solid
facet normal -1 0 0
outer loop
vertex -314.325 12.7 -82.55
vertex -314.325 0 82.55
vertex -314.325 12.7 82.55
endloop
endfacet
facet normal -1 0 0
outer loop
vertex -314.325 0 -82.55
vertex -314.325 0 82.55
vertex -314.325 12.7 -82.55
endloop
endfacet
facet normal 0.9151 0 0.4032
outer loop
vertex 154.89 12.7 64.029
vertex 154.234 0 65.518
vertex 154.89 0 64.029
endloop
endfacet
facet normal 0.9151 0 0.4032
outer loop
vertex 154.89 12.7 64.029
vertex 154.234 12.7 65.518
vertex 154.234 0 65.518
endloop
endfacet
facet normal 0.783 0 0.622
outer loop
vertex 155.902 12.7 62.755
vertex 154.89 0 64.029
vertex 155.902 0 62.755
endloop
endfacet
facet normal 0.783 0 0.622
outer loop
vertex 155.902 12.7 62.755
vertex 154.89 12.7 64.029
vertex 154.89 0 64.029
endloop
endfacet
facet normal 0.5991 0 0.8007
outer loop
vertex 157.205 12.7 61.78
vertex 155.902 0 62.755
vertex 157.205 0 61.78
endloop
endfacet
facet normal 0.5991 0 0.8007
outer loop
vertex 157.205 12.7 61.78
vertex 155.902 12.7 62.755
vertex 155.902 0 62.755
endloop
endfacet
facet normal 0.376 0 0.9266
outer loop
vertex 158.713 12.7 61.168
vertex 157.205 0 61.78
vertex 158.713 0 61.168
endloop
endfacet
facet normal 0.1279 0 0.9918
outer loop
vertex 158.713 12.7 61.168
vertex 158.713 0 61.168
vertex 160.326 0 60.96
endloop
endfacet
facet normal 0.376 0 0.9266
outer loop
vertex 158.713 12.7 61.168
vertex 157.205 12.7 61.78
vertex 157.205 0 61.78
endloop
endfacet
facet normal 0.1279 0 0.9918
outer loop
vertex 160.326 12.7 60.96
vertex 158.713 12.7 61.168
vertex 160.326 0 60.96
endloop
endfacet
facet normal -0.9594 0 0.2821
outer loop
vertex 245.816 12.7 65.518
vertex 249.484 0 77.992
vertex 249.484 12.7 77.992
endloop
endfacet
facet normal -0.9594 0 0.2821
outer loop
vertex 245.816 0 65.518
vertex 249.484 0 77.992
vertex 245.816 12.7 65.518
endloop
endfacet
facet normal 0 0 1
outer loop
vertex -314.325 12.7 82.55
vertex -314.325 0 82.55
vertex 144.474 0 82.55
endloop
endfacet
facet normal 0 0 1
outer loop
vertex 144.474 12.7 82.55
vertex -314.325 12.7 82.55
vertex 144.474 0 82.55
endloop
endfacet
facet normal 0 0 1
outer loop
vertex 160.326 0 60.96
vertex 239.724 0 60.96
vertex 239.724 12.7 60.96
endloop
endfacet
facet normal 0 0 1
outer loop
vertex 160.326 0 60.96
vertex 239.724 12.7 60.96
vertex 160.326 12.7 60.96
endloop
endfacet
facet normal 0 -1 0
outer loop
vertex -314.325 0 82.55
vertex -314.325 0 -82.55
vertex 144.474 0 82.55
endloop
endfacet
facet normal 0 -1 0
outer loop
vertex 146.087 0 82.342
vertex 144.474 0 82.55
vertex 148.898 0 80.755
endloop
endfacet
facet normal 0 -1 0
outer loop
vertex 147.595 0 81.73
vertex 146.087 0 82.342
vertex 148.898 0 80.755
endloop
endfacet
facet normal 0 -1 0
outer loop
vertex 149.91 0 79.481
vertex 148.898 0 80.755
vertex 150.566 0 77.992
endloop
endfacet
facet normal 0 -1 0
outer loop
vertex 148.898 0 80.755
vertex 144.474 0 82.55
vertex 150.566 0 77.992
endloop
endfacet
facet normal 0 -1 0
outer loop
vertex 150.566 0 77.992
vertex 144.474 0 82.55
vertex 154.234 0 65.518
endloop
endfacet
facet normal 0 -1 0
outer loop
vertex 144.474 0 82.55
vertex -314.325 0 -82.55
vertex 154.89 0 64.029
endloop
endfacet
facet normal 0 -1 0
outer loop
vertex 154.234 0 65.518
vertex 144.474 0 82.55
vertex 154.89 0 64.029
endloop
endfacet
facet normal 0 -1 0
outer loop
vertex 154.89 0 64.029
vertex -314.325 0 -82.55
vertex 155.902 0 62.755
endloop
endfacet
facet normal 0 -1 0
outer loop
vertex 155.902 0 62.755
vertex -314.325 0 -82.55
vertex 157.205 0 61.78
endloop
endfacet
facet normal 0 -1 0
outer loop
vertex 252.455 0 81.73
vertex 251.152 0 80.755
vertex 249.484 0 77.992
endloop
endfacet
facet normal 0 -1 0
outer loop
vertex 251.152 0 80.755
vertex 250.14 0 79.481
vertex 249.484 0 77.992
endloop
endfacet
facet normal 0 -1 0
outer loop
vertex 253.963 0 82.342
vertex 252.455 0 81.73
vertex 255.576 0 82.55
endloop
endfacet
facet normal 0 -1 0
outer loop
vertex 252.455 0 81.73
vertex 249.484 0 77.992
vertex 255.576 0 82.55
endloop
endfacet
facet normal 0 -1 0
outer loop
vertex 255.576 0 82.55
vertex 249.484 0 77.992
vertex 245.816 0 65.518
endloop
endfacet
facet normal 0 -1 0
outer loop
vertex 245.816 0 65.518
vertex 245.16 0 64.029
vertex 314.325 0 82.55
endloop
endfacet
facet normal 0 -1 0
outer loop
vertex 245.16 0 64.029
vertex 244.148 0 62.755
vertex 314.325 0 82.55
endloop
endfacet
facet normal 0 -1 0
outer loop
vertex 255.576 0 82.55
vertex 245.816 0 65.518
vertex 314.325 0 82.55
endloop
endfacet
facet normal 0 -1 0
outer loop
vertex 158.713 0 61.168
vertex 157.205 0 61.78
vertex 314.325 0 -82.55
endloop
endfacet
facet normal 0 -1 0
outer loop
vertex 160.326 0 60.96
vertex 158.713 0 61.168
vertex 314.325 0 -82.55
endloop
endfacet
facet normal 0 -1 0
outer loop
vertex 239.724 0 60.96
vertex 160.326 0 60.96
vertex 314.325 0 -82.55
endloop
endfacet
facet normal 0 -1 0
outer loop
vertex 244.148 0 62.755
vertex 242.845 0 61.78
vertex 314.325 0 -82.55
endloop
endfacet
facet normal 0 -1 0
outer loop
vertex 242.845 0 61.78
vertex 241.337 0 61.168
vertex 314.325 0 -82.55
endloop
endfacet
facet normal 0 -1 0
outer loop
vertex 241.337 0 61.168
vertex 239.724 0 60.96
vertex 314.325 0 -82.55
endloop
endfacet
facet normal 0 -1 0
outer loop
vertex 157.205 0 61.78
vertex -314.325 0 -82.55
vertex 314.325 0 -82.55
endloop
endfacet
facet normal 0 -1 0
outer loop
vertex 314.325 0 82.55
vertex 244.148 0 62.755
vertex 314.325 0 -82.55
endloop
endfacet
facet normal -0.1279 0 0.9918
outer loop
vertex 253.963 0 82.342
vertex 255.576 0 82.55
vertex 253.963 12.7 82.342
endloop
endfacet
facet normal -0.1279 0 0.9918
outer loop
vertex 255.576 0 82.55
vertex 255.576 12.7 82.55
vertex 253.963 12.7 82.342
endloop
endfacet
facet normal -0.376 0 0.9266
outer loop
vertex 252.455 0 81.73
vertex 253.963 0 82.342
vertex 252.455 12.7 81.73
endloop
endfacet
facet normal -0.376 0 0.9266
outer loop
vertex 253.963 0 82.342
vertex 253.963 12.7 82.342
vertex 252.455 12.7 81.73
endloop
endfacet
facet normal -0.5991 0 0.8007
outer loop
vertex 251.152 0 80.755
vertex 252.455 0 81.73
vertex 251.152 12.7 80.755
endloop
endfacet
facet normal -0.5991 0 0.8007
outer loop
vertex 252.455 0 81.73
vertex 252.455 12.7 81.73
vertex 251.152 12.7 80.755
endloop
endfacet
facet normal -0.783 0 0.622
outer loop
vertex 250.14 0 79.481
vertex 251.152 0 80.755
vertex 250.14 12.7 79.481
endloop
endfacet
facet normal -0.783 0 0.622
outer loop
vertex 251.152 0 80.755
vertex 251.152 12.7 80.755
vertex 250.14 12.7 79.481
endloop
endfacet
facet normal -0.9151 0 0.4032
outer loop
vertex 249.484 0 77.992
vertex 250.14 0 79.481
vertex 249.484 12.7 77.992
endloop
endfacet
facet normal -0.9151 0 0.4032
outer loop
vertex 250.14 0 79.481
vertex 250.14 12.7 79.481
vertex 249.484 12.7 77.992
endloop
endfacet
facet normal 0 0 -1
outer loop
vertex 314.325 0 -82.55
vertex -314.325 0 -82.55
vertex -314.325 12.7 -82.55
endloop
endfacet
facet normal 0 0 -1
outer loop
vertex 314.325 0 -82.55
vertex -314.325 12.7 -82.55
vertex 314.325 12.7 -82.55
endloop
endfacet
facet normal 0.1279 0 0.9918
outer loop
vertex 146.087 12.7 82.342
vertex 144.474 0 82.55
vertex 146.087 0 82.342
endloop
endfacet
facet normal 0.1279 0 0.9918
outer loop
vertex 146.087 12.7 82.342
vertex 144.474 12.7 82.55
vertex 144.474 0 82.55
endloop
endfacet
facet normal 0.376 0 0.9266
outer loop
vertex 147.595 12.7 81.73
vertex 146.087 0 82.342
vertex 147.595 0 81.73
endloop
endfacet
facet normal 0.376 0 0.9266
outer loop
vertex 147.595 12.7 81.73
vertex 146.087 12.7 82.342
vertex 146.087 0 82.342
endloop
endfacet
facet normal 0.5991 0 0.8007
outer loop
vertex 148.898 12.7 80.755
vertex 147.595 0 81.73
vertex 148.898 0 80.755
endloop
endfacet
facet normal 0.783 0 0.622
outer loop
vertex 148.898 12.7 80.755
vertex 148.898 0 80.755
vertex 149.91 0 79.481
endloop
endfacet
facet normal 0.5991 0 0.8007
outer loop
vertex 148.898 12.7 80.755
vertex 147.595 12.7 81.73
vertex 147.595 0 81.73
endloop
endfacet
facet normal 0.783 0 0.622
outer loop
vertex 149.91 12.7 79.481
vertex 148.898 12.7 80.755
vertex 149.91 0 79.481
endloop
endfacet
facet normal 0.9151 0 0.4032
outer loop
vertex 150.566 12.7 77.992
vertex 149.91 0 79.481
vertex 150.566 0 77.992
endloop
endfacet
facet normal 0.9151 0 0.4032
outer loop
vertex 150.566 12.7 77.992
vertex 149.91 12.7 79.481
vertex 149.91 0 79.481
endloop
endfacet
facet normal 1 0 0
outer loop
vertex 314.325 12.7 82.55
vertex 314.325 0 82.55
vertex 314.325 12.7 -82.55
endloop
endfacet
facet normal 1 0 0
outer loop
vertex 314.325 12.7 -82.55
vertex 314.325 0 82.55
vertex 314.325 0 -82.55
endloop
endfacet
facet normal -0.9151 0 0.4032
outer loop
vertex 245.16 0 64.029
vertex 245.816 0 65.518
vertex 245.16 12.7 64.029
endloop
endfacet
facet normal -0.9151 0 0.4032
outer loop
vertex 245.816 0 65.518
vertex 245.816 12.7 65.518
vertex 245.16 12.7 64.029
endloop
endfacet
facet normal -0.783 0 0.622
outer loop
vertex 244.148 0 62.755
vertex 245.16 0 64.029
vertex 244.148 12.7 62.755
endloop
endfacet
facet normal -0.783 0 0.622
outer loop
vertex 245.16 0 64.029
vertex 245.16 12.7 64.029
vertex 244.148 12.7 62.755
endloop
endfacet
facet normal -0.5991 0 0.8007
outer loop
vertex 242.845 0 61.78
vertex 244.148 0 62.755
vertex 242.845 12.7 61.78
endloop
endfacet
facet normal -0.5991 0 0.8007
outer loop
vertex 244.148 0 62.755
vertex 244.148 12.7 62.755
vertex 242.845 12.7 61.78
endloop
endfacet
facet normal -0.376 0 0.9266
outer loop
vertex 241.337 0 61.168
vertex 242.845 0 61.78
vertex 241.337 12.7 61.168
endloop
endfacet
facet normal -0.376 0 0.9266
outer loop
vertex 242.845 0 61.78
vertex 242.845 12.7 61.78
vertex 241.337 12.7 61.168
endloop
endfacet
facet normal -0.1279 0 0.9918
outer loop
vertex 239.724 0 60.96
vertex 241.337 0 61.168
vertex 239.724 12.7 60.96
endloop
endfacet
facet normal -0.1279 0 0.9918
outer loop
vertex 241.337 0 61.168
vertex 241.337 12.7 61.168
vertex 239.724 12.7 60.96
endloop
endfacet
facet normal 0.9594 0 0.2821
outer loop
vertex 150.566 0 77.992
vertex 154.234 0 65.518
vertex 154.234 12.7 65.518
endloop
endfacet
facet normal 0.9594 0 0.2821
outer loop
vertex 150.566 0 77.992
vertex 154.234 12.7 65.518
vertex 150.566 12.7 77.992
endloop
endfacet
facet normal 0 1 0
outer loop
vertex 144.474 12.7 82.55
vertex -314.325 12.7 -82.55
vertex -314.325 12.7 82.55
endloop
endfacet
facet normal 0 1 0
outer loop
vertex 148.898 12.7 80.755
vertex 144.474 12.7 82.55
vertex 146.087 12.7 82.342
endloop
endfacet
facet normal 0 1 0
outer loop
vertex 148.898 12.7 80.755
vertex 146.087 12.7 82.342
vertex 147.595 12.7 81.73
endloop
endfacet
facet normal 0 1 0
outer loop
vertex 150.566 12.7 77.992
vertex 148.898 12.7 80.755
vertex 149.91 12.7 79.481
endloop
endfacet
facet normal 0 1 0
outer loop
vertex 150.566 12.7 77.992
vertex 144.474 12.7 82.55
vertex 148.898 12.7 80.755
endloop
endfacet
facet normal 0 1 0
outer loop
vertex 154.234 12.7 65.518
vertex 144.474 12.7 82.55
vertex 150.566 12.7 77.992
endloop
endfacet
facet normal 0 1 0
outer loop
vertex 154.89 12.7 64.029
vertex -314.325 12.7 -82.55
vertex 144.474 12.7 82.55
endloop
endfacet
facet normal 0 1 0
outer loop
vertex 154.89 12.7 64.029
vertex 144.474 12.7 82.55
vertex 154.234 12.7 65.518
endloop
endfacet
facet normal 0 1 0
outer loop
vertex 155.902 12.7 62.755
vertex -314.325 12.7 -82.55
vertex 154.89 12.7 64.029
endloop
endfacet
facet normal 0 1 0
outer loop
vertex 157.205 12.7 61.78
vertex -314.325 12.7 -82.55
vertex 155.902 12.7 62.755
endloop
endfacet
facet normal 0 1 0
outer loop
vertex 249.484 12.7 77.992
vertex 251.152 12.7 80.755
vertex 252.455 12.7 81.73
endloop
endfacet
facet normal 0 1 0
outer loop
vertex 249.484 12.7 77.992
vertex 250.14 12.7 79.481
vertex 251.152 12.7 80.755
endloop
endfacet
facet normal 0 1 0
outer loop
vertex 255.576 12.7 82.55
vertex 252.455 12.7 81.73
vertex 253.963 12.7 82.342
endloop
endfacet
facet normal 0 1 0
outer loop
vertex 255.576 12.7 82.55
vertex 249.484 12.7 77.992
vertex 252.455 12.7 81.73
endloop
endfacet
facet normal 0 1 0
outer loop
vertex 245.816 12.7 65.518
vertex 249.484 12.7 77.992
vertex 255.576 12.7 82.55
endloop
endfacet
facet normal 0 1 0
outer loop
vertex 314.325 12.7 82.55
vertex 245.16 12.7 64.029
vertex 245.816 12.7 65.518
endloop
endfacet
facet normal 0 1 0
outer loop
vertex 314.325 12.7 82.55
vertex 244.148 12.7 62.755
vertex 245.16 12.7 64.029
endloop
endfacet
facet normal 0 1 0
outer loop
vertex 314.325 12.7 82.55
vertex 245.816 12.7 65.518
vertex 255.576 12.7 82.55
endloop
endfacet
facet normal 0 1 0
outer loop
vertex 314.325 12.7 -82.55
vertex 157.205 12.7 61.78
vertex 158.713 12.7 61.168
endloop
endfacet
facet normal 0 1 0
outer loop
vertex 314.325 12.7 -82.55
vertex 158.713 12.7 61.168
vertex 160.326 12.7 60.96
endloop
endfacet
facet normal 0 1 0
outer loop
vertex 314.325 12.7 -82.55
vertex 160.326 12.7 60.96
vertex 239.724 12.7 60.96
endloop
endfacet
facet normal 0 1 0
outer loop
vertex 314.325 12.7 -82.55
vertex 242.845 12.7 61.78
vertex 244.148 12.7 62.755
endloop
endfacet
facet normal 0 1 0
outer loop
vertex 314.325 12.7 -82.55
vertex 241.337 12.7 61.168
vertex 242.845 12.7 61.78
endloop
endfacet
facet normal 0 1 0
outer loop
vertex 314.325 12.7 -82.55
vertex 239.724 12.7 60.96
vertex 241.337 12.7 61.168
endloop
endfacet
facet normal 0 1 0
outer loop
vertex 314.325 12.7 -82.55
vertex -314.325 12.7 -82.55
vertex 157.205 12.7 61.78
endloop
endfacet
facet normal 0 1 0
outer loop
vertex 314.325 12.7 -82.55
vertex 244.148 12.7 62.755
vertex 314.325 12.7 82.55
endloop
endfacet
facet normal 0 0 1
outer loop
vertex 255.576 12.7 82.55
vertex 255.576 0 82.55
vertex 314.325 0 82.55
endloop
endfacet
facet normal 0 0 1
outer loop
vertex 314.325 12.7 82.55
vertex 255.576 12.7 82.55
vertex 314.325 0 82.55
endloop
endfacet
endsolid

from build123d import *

# Parameters (mm, degrees)
SKETCH1_W           = 628.65
SKETCH1_H           = 165.1
BOSS_EXTRUDE1_DEPTH = 12.7
CUT_EXTRUDE1_DEPTH  = 12.7
FILLET1_R           = 6.35


with BuildPart() as part:
    # Sketch1 → Boss-Extrude1 (new body)
    with BuildSketch(Plane(origin=(0, 0, 0), x_dir=(1, 0, 0), z_dir=(0, 1, 0))):
        Rectangle(SKETCH1_W, SKETCH1_H)
    extrude(amount=BOSS_EXTRUDE1_DEPTH)

    # Sketch2 → Cut-Extrude1 (cut)
    with BuildSketch(Plane.XZ):
        Polygon((149.225, 82.55), (250.825, 82.55), (244.475, 60.96), (155.575, 60.96), align=None)
    extrude(amount=-CUT_EXTRUDE1_DEPTH, mode=Mode.SUBTRACT)

    # Fillet1
    fillet1_edges = [part.edges().sort_by_distance(p)[0] for p in [
        (155.575, 6.35, 60.96),
        (149.225, 6.35, 82.55),
        (250.825, 6.35, 82.55),
        (244.475, 6.35, 60.96),
    ]]
    fillet(fillet1_edges, radius=FILLET1_R)


solid = part.part
